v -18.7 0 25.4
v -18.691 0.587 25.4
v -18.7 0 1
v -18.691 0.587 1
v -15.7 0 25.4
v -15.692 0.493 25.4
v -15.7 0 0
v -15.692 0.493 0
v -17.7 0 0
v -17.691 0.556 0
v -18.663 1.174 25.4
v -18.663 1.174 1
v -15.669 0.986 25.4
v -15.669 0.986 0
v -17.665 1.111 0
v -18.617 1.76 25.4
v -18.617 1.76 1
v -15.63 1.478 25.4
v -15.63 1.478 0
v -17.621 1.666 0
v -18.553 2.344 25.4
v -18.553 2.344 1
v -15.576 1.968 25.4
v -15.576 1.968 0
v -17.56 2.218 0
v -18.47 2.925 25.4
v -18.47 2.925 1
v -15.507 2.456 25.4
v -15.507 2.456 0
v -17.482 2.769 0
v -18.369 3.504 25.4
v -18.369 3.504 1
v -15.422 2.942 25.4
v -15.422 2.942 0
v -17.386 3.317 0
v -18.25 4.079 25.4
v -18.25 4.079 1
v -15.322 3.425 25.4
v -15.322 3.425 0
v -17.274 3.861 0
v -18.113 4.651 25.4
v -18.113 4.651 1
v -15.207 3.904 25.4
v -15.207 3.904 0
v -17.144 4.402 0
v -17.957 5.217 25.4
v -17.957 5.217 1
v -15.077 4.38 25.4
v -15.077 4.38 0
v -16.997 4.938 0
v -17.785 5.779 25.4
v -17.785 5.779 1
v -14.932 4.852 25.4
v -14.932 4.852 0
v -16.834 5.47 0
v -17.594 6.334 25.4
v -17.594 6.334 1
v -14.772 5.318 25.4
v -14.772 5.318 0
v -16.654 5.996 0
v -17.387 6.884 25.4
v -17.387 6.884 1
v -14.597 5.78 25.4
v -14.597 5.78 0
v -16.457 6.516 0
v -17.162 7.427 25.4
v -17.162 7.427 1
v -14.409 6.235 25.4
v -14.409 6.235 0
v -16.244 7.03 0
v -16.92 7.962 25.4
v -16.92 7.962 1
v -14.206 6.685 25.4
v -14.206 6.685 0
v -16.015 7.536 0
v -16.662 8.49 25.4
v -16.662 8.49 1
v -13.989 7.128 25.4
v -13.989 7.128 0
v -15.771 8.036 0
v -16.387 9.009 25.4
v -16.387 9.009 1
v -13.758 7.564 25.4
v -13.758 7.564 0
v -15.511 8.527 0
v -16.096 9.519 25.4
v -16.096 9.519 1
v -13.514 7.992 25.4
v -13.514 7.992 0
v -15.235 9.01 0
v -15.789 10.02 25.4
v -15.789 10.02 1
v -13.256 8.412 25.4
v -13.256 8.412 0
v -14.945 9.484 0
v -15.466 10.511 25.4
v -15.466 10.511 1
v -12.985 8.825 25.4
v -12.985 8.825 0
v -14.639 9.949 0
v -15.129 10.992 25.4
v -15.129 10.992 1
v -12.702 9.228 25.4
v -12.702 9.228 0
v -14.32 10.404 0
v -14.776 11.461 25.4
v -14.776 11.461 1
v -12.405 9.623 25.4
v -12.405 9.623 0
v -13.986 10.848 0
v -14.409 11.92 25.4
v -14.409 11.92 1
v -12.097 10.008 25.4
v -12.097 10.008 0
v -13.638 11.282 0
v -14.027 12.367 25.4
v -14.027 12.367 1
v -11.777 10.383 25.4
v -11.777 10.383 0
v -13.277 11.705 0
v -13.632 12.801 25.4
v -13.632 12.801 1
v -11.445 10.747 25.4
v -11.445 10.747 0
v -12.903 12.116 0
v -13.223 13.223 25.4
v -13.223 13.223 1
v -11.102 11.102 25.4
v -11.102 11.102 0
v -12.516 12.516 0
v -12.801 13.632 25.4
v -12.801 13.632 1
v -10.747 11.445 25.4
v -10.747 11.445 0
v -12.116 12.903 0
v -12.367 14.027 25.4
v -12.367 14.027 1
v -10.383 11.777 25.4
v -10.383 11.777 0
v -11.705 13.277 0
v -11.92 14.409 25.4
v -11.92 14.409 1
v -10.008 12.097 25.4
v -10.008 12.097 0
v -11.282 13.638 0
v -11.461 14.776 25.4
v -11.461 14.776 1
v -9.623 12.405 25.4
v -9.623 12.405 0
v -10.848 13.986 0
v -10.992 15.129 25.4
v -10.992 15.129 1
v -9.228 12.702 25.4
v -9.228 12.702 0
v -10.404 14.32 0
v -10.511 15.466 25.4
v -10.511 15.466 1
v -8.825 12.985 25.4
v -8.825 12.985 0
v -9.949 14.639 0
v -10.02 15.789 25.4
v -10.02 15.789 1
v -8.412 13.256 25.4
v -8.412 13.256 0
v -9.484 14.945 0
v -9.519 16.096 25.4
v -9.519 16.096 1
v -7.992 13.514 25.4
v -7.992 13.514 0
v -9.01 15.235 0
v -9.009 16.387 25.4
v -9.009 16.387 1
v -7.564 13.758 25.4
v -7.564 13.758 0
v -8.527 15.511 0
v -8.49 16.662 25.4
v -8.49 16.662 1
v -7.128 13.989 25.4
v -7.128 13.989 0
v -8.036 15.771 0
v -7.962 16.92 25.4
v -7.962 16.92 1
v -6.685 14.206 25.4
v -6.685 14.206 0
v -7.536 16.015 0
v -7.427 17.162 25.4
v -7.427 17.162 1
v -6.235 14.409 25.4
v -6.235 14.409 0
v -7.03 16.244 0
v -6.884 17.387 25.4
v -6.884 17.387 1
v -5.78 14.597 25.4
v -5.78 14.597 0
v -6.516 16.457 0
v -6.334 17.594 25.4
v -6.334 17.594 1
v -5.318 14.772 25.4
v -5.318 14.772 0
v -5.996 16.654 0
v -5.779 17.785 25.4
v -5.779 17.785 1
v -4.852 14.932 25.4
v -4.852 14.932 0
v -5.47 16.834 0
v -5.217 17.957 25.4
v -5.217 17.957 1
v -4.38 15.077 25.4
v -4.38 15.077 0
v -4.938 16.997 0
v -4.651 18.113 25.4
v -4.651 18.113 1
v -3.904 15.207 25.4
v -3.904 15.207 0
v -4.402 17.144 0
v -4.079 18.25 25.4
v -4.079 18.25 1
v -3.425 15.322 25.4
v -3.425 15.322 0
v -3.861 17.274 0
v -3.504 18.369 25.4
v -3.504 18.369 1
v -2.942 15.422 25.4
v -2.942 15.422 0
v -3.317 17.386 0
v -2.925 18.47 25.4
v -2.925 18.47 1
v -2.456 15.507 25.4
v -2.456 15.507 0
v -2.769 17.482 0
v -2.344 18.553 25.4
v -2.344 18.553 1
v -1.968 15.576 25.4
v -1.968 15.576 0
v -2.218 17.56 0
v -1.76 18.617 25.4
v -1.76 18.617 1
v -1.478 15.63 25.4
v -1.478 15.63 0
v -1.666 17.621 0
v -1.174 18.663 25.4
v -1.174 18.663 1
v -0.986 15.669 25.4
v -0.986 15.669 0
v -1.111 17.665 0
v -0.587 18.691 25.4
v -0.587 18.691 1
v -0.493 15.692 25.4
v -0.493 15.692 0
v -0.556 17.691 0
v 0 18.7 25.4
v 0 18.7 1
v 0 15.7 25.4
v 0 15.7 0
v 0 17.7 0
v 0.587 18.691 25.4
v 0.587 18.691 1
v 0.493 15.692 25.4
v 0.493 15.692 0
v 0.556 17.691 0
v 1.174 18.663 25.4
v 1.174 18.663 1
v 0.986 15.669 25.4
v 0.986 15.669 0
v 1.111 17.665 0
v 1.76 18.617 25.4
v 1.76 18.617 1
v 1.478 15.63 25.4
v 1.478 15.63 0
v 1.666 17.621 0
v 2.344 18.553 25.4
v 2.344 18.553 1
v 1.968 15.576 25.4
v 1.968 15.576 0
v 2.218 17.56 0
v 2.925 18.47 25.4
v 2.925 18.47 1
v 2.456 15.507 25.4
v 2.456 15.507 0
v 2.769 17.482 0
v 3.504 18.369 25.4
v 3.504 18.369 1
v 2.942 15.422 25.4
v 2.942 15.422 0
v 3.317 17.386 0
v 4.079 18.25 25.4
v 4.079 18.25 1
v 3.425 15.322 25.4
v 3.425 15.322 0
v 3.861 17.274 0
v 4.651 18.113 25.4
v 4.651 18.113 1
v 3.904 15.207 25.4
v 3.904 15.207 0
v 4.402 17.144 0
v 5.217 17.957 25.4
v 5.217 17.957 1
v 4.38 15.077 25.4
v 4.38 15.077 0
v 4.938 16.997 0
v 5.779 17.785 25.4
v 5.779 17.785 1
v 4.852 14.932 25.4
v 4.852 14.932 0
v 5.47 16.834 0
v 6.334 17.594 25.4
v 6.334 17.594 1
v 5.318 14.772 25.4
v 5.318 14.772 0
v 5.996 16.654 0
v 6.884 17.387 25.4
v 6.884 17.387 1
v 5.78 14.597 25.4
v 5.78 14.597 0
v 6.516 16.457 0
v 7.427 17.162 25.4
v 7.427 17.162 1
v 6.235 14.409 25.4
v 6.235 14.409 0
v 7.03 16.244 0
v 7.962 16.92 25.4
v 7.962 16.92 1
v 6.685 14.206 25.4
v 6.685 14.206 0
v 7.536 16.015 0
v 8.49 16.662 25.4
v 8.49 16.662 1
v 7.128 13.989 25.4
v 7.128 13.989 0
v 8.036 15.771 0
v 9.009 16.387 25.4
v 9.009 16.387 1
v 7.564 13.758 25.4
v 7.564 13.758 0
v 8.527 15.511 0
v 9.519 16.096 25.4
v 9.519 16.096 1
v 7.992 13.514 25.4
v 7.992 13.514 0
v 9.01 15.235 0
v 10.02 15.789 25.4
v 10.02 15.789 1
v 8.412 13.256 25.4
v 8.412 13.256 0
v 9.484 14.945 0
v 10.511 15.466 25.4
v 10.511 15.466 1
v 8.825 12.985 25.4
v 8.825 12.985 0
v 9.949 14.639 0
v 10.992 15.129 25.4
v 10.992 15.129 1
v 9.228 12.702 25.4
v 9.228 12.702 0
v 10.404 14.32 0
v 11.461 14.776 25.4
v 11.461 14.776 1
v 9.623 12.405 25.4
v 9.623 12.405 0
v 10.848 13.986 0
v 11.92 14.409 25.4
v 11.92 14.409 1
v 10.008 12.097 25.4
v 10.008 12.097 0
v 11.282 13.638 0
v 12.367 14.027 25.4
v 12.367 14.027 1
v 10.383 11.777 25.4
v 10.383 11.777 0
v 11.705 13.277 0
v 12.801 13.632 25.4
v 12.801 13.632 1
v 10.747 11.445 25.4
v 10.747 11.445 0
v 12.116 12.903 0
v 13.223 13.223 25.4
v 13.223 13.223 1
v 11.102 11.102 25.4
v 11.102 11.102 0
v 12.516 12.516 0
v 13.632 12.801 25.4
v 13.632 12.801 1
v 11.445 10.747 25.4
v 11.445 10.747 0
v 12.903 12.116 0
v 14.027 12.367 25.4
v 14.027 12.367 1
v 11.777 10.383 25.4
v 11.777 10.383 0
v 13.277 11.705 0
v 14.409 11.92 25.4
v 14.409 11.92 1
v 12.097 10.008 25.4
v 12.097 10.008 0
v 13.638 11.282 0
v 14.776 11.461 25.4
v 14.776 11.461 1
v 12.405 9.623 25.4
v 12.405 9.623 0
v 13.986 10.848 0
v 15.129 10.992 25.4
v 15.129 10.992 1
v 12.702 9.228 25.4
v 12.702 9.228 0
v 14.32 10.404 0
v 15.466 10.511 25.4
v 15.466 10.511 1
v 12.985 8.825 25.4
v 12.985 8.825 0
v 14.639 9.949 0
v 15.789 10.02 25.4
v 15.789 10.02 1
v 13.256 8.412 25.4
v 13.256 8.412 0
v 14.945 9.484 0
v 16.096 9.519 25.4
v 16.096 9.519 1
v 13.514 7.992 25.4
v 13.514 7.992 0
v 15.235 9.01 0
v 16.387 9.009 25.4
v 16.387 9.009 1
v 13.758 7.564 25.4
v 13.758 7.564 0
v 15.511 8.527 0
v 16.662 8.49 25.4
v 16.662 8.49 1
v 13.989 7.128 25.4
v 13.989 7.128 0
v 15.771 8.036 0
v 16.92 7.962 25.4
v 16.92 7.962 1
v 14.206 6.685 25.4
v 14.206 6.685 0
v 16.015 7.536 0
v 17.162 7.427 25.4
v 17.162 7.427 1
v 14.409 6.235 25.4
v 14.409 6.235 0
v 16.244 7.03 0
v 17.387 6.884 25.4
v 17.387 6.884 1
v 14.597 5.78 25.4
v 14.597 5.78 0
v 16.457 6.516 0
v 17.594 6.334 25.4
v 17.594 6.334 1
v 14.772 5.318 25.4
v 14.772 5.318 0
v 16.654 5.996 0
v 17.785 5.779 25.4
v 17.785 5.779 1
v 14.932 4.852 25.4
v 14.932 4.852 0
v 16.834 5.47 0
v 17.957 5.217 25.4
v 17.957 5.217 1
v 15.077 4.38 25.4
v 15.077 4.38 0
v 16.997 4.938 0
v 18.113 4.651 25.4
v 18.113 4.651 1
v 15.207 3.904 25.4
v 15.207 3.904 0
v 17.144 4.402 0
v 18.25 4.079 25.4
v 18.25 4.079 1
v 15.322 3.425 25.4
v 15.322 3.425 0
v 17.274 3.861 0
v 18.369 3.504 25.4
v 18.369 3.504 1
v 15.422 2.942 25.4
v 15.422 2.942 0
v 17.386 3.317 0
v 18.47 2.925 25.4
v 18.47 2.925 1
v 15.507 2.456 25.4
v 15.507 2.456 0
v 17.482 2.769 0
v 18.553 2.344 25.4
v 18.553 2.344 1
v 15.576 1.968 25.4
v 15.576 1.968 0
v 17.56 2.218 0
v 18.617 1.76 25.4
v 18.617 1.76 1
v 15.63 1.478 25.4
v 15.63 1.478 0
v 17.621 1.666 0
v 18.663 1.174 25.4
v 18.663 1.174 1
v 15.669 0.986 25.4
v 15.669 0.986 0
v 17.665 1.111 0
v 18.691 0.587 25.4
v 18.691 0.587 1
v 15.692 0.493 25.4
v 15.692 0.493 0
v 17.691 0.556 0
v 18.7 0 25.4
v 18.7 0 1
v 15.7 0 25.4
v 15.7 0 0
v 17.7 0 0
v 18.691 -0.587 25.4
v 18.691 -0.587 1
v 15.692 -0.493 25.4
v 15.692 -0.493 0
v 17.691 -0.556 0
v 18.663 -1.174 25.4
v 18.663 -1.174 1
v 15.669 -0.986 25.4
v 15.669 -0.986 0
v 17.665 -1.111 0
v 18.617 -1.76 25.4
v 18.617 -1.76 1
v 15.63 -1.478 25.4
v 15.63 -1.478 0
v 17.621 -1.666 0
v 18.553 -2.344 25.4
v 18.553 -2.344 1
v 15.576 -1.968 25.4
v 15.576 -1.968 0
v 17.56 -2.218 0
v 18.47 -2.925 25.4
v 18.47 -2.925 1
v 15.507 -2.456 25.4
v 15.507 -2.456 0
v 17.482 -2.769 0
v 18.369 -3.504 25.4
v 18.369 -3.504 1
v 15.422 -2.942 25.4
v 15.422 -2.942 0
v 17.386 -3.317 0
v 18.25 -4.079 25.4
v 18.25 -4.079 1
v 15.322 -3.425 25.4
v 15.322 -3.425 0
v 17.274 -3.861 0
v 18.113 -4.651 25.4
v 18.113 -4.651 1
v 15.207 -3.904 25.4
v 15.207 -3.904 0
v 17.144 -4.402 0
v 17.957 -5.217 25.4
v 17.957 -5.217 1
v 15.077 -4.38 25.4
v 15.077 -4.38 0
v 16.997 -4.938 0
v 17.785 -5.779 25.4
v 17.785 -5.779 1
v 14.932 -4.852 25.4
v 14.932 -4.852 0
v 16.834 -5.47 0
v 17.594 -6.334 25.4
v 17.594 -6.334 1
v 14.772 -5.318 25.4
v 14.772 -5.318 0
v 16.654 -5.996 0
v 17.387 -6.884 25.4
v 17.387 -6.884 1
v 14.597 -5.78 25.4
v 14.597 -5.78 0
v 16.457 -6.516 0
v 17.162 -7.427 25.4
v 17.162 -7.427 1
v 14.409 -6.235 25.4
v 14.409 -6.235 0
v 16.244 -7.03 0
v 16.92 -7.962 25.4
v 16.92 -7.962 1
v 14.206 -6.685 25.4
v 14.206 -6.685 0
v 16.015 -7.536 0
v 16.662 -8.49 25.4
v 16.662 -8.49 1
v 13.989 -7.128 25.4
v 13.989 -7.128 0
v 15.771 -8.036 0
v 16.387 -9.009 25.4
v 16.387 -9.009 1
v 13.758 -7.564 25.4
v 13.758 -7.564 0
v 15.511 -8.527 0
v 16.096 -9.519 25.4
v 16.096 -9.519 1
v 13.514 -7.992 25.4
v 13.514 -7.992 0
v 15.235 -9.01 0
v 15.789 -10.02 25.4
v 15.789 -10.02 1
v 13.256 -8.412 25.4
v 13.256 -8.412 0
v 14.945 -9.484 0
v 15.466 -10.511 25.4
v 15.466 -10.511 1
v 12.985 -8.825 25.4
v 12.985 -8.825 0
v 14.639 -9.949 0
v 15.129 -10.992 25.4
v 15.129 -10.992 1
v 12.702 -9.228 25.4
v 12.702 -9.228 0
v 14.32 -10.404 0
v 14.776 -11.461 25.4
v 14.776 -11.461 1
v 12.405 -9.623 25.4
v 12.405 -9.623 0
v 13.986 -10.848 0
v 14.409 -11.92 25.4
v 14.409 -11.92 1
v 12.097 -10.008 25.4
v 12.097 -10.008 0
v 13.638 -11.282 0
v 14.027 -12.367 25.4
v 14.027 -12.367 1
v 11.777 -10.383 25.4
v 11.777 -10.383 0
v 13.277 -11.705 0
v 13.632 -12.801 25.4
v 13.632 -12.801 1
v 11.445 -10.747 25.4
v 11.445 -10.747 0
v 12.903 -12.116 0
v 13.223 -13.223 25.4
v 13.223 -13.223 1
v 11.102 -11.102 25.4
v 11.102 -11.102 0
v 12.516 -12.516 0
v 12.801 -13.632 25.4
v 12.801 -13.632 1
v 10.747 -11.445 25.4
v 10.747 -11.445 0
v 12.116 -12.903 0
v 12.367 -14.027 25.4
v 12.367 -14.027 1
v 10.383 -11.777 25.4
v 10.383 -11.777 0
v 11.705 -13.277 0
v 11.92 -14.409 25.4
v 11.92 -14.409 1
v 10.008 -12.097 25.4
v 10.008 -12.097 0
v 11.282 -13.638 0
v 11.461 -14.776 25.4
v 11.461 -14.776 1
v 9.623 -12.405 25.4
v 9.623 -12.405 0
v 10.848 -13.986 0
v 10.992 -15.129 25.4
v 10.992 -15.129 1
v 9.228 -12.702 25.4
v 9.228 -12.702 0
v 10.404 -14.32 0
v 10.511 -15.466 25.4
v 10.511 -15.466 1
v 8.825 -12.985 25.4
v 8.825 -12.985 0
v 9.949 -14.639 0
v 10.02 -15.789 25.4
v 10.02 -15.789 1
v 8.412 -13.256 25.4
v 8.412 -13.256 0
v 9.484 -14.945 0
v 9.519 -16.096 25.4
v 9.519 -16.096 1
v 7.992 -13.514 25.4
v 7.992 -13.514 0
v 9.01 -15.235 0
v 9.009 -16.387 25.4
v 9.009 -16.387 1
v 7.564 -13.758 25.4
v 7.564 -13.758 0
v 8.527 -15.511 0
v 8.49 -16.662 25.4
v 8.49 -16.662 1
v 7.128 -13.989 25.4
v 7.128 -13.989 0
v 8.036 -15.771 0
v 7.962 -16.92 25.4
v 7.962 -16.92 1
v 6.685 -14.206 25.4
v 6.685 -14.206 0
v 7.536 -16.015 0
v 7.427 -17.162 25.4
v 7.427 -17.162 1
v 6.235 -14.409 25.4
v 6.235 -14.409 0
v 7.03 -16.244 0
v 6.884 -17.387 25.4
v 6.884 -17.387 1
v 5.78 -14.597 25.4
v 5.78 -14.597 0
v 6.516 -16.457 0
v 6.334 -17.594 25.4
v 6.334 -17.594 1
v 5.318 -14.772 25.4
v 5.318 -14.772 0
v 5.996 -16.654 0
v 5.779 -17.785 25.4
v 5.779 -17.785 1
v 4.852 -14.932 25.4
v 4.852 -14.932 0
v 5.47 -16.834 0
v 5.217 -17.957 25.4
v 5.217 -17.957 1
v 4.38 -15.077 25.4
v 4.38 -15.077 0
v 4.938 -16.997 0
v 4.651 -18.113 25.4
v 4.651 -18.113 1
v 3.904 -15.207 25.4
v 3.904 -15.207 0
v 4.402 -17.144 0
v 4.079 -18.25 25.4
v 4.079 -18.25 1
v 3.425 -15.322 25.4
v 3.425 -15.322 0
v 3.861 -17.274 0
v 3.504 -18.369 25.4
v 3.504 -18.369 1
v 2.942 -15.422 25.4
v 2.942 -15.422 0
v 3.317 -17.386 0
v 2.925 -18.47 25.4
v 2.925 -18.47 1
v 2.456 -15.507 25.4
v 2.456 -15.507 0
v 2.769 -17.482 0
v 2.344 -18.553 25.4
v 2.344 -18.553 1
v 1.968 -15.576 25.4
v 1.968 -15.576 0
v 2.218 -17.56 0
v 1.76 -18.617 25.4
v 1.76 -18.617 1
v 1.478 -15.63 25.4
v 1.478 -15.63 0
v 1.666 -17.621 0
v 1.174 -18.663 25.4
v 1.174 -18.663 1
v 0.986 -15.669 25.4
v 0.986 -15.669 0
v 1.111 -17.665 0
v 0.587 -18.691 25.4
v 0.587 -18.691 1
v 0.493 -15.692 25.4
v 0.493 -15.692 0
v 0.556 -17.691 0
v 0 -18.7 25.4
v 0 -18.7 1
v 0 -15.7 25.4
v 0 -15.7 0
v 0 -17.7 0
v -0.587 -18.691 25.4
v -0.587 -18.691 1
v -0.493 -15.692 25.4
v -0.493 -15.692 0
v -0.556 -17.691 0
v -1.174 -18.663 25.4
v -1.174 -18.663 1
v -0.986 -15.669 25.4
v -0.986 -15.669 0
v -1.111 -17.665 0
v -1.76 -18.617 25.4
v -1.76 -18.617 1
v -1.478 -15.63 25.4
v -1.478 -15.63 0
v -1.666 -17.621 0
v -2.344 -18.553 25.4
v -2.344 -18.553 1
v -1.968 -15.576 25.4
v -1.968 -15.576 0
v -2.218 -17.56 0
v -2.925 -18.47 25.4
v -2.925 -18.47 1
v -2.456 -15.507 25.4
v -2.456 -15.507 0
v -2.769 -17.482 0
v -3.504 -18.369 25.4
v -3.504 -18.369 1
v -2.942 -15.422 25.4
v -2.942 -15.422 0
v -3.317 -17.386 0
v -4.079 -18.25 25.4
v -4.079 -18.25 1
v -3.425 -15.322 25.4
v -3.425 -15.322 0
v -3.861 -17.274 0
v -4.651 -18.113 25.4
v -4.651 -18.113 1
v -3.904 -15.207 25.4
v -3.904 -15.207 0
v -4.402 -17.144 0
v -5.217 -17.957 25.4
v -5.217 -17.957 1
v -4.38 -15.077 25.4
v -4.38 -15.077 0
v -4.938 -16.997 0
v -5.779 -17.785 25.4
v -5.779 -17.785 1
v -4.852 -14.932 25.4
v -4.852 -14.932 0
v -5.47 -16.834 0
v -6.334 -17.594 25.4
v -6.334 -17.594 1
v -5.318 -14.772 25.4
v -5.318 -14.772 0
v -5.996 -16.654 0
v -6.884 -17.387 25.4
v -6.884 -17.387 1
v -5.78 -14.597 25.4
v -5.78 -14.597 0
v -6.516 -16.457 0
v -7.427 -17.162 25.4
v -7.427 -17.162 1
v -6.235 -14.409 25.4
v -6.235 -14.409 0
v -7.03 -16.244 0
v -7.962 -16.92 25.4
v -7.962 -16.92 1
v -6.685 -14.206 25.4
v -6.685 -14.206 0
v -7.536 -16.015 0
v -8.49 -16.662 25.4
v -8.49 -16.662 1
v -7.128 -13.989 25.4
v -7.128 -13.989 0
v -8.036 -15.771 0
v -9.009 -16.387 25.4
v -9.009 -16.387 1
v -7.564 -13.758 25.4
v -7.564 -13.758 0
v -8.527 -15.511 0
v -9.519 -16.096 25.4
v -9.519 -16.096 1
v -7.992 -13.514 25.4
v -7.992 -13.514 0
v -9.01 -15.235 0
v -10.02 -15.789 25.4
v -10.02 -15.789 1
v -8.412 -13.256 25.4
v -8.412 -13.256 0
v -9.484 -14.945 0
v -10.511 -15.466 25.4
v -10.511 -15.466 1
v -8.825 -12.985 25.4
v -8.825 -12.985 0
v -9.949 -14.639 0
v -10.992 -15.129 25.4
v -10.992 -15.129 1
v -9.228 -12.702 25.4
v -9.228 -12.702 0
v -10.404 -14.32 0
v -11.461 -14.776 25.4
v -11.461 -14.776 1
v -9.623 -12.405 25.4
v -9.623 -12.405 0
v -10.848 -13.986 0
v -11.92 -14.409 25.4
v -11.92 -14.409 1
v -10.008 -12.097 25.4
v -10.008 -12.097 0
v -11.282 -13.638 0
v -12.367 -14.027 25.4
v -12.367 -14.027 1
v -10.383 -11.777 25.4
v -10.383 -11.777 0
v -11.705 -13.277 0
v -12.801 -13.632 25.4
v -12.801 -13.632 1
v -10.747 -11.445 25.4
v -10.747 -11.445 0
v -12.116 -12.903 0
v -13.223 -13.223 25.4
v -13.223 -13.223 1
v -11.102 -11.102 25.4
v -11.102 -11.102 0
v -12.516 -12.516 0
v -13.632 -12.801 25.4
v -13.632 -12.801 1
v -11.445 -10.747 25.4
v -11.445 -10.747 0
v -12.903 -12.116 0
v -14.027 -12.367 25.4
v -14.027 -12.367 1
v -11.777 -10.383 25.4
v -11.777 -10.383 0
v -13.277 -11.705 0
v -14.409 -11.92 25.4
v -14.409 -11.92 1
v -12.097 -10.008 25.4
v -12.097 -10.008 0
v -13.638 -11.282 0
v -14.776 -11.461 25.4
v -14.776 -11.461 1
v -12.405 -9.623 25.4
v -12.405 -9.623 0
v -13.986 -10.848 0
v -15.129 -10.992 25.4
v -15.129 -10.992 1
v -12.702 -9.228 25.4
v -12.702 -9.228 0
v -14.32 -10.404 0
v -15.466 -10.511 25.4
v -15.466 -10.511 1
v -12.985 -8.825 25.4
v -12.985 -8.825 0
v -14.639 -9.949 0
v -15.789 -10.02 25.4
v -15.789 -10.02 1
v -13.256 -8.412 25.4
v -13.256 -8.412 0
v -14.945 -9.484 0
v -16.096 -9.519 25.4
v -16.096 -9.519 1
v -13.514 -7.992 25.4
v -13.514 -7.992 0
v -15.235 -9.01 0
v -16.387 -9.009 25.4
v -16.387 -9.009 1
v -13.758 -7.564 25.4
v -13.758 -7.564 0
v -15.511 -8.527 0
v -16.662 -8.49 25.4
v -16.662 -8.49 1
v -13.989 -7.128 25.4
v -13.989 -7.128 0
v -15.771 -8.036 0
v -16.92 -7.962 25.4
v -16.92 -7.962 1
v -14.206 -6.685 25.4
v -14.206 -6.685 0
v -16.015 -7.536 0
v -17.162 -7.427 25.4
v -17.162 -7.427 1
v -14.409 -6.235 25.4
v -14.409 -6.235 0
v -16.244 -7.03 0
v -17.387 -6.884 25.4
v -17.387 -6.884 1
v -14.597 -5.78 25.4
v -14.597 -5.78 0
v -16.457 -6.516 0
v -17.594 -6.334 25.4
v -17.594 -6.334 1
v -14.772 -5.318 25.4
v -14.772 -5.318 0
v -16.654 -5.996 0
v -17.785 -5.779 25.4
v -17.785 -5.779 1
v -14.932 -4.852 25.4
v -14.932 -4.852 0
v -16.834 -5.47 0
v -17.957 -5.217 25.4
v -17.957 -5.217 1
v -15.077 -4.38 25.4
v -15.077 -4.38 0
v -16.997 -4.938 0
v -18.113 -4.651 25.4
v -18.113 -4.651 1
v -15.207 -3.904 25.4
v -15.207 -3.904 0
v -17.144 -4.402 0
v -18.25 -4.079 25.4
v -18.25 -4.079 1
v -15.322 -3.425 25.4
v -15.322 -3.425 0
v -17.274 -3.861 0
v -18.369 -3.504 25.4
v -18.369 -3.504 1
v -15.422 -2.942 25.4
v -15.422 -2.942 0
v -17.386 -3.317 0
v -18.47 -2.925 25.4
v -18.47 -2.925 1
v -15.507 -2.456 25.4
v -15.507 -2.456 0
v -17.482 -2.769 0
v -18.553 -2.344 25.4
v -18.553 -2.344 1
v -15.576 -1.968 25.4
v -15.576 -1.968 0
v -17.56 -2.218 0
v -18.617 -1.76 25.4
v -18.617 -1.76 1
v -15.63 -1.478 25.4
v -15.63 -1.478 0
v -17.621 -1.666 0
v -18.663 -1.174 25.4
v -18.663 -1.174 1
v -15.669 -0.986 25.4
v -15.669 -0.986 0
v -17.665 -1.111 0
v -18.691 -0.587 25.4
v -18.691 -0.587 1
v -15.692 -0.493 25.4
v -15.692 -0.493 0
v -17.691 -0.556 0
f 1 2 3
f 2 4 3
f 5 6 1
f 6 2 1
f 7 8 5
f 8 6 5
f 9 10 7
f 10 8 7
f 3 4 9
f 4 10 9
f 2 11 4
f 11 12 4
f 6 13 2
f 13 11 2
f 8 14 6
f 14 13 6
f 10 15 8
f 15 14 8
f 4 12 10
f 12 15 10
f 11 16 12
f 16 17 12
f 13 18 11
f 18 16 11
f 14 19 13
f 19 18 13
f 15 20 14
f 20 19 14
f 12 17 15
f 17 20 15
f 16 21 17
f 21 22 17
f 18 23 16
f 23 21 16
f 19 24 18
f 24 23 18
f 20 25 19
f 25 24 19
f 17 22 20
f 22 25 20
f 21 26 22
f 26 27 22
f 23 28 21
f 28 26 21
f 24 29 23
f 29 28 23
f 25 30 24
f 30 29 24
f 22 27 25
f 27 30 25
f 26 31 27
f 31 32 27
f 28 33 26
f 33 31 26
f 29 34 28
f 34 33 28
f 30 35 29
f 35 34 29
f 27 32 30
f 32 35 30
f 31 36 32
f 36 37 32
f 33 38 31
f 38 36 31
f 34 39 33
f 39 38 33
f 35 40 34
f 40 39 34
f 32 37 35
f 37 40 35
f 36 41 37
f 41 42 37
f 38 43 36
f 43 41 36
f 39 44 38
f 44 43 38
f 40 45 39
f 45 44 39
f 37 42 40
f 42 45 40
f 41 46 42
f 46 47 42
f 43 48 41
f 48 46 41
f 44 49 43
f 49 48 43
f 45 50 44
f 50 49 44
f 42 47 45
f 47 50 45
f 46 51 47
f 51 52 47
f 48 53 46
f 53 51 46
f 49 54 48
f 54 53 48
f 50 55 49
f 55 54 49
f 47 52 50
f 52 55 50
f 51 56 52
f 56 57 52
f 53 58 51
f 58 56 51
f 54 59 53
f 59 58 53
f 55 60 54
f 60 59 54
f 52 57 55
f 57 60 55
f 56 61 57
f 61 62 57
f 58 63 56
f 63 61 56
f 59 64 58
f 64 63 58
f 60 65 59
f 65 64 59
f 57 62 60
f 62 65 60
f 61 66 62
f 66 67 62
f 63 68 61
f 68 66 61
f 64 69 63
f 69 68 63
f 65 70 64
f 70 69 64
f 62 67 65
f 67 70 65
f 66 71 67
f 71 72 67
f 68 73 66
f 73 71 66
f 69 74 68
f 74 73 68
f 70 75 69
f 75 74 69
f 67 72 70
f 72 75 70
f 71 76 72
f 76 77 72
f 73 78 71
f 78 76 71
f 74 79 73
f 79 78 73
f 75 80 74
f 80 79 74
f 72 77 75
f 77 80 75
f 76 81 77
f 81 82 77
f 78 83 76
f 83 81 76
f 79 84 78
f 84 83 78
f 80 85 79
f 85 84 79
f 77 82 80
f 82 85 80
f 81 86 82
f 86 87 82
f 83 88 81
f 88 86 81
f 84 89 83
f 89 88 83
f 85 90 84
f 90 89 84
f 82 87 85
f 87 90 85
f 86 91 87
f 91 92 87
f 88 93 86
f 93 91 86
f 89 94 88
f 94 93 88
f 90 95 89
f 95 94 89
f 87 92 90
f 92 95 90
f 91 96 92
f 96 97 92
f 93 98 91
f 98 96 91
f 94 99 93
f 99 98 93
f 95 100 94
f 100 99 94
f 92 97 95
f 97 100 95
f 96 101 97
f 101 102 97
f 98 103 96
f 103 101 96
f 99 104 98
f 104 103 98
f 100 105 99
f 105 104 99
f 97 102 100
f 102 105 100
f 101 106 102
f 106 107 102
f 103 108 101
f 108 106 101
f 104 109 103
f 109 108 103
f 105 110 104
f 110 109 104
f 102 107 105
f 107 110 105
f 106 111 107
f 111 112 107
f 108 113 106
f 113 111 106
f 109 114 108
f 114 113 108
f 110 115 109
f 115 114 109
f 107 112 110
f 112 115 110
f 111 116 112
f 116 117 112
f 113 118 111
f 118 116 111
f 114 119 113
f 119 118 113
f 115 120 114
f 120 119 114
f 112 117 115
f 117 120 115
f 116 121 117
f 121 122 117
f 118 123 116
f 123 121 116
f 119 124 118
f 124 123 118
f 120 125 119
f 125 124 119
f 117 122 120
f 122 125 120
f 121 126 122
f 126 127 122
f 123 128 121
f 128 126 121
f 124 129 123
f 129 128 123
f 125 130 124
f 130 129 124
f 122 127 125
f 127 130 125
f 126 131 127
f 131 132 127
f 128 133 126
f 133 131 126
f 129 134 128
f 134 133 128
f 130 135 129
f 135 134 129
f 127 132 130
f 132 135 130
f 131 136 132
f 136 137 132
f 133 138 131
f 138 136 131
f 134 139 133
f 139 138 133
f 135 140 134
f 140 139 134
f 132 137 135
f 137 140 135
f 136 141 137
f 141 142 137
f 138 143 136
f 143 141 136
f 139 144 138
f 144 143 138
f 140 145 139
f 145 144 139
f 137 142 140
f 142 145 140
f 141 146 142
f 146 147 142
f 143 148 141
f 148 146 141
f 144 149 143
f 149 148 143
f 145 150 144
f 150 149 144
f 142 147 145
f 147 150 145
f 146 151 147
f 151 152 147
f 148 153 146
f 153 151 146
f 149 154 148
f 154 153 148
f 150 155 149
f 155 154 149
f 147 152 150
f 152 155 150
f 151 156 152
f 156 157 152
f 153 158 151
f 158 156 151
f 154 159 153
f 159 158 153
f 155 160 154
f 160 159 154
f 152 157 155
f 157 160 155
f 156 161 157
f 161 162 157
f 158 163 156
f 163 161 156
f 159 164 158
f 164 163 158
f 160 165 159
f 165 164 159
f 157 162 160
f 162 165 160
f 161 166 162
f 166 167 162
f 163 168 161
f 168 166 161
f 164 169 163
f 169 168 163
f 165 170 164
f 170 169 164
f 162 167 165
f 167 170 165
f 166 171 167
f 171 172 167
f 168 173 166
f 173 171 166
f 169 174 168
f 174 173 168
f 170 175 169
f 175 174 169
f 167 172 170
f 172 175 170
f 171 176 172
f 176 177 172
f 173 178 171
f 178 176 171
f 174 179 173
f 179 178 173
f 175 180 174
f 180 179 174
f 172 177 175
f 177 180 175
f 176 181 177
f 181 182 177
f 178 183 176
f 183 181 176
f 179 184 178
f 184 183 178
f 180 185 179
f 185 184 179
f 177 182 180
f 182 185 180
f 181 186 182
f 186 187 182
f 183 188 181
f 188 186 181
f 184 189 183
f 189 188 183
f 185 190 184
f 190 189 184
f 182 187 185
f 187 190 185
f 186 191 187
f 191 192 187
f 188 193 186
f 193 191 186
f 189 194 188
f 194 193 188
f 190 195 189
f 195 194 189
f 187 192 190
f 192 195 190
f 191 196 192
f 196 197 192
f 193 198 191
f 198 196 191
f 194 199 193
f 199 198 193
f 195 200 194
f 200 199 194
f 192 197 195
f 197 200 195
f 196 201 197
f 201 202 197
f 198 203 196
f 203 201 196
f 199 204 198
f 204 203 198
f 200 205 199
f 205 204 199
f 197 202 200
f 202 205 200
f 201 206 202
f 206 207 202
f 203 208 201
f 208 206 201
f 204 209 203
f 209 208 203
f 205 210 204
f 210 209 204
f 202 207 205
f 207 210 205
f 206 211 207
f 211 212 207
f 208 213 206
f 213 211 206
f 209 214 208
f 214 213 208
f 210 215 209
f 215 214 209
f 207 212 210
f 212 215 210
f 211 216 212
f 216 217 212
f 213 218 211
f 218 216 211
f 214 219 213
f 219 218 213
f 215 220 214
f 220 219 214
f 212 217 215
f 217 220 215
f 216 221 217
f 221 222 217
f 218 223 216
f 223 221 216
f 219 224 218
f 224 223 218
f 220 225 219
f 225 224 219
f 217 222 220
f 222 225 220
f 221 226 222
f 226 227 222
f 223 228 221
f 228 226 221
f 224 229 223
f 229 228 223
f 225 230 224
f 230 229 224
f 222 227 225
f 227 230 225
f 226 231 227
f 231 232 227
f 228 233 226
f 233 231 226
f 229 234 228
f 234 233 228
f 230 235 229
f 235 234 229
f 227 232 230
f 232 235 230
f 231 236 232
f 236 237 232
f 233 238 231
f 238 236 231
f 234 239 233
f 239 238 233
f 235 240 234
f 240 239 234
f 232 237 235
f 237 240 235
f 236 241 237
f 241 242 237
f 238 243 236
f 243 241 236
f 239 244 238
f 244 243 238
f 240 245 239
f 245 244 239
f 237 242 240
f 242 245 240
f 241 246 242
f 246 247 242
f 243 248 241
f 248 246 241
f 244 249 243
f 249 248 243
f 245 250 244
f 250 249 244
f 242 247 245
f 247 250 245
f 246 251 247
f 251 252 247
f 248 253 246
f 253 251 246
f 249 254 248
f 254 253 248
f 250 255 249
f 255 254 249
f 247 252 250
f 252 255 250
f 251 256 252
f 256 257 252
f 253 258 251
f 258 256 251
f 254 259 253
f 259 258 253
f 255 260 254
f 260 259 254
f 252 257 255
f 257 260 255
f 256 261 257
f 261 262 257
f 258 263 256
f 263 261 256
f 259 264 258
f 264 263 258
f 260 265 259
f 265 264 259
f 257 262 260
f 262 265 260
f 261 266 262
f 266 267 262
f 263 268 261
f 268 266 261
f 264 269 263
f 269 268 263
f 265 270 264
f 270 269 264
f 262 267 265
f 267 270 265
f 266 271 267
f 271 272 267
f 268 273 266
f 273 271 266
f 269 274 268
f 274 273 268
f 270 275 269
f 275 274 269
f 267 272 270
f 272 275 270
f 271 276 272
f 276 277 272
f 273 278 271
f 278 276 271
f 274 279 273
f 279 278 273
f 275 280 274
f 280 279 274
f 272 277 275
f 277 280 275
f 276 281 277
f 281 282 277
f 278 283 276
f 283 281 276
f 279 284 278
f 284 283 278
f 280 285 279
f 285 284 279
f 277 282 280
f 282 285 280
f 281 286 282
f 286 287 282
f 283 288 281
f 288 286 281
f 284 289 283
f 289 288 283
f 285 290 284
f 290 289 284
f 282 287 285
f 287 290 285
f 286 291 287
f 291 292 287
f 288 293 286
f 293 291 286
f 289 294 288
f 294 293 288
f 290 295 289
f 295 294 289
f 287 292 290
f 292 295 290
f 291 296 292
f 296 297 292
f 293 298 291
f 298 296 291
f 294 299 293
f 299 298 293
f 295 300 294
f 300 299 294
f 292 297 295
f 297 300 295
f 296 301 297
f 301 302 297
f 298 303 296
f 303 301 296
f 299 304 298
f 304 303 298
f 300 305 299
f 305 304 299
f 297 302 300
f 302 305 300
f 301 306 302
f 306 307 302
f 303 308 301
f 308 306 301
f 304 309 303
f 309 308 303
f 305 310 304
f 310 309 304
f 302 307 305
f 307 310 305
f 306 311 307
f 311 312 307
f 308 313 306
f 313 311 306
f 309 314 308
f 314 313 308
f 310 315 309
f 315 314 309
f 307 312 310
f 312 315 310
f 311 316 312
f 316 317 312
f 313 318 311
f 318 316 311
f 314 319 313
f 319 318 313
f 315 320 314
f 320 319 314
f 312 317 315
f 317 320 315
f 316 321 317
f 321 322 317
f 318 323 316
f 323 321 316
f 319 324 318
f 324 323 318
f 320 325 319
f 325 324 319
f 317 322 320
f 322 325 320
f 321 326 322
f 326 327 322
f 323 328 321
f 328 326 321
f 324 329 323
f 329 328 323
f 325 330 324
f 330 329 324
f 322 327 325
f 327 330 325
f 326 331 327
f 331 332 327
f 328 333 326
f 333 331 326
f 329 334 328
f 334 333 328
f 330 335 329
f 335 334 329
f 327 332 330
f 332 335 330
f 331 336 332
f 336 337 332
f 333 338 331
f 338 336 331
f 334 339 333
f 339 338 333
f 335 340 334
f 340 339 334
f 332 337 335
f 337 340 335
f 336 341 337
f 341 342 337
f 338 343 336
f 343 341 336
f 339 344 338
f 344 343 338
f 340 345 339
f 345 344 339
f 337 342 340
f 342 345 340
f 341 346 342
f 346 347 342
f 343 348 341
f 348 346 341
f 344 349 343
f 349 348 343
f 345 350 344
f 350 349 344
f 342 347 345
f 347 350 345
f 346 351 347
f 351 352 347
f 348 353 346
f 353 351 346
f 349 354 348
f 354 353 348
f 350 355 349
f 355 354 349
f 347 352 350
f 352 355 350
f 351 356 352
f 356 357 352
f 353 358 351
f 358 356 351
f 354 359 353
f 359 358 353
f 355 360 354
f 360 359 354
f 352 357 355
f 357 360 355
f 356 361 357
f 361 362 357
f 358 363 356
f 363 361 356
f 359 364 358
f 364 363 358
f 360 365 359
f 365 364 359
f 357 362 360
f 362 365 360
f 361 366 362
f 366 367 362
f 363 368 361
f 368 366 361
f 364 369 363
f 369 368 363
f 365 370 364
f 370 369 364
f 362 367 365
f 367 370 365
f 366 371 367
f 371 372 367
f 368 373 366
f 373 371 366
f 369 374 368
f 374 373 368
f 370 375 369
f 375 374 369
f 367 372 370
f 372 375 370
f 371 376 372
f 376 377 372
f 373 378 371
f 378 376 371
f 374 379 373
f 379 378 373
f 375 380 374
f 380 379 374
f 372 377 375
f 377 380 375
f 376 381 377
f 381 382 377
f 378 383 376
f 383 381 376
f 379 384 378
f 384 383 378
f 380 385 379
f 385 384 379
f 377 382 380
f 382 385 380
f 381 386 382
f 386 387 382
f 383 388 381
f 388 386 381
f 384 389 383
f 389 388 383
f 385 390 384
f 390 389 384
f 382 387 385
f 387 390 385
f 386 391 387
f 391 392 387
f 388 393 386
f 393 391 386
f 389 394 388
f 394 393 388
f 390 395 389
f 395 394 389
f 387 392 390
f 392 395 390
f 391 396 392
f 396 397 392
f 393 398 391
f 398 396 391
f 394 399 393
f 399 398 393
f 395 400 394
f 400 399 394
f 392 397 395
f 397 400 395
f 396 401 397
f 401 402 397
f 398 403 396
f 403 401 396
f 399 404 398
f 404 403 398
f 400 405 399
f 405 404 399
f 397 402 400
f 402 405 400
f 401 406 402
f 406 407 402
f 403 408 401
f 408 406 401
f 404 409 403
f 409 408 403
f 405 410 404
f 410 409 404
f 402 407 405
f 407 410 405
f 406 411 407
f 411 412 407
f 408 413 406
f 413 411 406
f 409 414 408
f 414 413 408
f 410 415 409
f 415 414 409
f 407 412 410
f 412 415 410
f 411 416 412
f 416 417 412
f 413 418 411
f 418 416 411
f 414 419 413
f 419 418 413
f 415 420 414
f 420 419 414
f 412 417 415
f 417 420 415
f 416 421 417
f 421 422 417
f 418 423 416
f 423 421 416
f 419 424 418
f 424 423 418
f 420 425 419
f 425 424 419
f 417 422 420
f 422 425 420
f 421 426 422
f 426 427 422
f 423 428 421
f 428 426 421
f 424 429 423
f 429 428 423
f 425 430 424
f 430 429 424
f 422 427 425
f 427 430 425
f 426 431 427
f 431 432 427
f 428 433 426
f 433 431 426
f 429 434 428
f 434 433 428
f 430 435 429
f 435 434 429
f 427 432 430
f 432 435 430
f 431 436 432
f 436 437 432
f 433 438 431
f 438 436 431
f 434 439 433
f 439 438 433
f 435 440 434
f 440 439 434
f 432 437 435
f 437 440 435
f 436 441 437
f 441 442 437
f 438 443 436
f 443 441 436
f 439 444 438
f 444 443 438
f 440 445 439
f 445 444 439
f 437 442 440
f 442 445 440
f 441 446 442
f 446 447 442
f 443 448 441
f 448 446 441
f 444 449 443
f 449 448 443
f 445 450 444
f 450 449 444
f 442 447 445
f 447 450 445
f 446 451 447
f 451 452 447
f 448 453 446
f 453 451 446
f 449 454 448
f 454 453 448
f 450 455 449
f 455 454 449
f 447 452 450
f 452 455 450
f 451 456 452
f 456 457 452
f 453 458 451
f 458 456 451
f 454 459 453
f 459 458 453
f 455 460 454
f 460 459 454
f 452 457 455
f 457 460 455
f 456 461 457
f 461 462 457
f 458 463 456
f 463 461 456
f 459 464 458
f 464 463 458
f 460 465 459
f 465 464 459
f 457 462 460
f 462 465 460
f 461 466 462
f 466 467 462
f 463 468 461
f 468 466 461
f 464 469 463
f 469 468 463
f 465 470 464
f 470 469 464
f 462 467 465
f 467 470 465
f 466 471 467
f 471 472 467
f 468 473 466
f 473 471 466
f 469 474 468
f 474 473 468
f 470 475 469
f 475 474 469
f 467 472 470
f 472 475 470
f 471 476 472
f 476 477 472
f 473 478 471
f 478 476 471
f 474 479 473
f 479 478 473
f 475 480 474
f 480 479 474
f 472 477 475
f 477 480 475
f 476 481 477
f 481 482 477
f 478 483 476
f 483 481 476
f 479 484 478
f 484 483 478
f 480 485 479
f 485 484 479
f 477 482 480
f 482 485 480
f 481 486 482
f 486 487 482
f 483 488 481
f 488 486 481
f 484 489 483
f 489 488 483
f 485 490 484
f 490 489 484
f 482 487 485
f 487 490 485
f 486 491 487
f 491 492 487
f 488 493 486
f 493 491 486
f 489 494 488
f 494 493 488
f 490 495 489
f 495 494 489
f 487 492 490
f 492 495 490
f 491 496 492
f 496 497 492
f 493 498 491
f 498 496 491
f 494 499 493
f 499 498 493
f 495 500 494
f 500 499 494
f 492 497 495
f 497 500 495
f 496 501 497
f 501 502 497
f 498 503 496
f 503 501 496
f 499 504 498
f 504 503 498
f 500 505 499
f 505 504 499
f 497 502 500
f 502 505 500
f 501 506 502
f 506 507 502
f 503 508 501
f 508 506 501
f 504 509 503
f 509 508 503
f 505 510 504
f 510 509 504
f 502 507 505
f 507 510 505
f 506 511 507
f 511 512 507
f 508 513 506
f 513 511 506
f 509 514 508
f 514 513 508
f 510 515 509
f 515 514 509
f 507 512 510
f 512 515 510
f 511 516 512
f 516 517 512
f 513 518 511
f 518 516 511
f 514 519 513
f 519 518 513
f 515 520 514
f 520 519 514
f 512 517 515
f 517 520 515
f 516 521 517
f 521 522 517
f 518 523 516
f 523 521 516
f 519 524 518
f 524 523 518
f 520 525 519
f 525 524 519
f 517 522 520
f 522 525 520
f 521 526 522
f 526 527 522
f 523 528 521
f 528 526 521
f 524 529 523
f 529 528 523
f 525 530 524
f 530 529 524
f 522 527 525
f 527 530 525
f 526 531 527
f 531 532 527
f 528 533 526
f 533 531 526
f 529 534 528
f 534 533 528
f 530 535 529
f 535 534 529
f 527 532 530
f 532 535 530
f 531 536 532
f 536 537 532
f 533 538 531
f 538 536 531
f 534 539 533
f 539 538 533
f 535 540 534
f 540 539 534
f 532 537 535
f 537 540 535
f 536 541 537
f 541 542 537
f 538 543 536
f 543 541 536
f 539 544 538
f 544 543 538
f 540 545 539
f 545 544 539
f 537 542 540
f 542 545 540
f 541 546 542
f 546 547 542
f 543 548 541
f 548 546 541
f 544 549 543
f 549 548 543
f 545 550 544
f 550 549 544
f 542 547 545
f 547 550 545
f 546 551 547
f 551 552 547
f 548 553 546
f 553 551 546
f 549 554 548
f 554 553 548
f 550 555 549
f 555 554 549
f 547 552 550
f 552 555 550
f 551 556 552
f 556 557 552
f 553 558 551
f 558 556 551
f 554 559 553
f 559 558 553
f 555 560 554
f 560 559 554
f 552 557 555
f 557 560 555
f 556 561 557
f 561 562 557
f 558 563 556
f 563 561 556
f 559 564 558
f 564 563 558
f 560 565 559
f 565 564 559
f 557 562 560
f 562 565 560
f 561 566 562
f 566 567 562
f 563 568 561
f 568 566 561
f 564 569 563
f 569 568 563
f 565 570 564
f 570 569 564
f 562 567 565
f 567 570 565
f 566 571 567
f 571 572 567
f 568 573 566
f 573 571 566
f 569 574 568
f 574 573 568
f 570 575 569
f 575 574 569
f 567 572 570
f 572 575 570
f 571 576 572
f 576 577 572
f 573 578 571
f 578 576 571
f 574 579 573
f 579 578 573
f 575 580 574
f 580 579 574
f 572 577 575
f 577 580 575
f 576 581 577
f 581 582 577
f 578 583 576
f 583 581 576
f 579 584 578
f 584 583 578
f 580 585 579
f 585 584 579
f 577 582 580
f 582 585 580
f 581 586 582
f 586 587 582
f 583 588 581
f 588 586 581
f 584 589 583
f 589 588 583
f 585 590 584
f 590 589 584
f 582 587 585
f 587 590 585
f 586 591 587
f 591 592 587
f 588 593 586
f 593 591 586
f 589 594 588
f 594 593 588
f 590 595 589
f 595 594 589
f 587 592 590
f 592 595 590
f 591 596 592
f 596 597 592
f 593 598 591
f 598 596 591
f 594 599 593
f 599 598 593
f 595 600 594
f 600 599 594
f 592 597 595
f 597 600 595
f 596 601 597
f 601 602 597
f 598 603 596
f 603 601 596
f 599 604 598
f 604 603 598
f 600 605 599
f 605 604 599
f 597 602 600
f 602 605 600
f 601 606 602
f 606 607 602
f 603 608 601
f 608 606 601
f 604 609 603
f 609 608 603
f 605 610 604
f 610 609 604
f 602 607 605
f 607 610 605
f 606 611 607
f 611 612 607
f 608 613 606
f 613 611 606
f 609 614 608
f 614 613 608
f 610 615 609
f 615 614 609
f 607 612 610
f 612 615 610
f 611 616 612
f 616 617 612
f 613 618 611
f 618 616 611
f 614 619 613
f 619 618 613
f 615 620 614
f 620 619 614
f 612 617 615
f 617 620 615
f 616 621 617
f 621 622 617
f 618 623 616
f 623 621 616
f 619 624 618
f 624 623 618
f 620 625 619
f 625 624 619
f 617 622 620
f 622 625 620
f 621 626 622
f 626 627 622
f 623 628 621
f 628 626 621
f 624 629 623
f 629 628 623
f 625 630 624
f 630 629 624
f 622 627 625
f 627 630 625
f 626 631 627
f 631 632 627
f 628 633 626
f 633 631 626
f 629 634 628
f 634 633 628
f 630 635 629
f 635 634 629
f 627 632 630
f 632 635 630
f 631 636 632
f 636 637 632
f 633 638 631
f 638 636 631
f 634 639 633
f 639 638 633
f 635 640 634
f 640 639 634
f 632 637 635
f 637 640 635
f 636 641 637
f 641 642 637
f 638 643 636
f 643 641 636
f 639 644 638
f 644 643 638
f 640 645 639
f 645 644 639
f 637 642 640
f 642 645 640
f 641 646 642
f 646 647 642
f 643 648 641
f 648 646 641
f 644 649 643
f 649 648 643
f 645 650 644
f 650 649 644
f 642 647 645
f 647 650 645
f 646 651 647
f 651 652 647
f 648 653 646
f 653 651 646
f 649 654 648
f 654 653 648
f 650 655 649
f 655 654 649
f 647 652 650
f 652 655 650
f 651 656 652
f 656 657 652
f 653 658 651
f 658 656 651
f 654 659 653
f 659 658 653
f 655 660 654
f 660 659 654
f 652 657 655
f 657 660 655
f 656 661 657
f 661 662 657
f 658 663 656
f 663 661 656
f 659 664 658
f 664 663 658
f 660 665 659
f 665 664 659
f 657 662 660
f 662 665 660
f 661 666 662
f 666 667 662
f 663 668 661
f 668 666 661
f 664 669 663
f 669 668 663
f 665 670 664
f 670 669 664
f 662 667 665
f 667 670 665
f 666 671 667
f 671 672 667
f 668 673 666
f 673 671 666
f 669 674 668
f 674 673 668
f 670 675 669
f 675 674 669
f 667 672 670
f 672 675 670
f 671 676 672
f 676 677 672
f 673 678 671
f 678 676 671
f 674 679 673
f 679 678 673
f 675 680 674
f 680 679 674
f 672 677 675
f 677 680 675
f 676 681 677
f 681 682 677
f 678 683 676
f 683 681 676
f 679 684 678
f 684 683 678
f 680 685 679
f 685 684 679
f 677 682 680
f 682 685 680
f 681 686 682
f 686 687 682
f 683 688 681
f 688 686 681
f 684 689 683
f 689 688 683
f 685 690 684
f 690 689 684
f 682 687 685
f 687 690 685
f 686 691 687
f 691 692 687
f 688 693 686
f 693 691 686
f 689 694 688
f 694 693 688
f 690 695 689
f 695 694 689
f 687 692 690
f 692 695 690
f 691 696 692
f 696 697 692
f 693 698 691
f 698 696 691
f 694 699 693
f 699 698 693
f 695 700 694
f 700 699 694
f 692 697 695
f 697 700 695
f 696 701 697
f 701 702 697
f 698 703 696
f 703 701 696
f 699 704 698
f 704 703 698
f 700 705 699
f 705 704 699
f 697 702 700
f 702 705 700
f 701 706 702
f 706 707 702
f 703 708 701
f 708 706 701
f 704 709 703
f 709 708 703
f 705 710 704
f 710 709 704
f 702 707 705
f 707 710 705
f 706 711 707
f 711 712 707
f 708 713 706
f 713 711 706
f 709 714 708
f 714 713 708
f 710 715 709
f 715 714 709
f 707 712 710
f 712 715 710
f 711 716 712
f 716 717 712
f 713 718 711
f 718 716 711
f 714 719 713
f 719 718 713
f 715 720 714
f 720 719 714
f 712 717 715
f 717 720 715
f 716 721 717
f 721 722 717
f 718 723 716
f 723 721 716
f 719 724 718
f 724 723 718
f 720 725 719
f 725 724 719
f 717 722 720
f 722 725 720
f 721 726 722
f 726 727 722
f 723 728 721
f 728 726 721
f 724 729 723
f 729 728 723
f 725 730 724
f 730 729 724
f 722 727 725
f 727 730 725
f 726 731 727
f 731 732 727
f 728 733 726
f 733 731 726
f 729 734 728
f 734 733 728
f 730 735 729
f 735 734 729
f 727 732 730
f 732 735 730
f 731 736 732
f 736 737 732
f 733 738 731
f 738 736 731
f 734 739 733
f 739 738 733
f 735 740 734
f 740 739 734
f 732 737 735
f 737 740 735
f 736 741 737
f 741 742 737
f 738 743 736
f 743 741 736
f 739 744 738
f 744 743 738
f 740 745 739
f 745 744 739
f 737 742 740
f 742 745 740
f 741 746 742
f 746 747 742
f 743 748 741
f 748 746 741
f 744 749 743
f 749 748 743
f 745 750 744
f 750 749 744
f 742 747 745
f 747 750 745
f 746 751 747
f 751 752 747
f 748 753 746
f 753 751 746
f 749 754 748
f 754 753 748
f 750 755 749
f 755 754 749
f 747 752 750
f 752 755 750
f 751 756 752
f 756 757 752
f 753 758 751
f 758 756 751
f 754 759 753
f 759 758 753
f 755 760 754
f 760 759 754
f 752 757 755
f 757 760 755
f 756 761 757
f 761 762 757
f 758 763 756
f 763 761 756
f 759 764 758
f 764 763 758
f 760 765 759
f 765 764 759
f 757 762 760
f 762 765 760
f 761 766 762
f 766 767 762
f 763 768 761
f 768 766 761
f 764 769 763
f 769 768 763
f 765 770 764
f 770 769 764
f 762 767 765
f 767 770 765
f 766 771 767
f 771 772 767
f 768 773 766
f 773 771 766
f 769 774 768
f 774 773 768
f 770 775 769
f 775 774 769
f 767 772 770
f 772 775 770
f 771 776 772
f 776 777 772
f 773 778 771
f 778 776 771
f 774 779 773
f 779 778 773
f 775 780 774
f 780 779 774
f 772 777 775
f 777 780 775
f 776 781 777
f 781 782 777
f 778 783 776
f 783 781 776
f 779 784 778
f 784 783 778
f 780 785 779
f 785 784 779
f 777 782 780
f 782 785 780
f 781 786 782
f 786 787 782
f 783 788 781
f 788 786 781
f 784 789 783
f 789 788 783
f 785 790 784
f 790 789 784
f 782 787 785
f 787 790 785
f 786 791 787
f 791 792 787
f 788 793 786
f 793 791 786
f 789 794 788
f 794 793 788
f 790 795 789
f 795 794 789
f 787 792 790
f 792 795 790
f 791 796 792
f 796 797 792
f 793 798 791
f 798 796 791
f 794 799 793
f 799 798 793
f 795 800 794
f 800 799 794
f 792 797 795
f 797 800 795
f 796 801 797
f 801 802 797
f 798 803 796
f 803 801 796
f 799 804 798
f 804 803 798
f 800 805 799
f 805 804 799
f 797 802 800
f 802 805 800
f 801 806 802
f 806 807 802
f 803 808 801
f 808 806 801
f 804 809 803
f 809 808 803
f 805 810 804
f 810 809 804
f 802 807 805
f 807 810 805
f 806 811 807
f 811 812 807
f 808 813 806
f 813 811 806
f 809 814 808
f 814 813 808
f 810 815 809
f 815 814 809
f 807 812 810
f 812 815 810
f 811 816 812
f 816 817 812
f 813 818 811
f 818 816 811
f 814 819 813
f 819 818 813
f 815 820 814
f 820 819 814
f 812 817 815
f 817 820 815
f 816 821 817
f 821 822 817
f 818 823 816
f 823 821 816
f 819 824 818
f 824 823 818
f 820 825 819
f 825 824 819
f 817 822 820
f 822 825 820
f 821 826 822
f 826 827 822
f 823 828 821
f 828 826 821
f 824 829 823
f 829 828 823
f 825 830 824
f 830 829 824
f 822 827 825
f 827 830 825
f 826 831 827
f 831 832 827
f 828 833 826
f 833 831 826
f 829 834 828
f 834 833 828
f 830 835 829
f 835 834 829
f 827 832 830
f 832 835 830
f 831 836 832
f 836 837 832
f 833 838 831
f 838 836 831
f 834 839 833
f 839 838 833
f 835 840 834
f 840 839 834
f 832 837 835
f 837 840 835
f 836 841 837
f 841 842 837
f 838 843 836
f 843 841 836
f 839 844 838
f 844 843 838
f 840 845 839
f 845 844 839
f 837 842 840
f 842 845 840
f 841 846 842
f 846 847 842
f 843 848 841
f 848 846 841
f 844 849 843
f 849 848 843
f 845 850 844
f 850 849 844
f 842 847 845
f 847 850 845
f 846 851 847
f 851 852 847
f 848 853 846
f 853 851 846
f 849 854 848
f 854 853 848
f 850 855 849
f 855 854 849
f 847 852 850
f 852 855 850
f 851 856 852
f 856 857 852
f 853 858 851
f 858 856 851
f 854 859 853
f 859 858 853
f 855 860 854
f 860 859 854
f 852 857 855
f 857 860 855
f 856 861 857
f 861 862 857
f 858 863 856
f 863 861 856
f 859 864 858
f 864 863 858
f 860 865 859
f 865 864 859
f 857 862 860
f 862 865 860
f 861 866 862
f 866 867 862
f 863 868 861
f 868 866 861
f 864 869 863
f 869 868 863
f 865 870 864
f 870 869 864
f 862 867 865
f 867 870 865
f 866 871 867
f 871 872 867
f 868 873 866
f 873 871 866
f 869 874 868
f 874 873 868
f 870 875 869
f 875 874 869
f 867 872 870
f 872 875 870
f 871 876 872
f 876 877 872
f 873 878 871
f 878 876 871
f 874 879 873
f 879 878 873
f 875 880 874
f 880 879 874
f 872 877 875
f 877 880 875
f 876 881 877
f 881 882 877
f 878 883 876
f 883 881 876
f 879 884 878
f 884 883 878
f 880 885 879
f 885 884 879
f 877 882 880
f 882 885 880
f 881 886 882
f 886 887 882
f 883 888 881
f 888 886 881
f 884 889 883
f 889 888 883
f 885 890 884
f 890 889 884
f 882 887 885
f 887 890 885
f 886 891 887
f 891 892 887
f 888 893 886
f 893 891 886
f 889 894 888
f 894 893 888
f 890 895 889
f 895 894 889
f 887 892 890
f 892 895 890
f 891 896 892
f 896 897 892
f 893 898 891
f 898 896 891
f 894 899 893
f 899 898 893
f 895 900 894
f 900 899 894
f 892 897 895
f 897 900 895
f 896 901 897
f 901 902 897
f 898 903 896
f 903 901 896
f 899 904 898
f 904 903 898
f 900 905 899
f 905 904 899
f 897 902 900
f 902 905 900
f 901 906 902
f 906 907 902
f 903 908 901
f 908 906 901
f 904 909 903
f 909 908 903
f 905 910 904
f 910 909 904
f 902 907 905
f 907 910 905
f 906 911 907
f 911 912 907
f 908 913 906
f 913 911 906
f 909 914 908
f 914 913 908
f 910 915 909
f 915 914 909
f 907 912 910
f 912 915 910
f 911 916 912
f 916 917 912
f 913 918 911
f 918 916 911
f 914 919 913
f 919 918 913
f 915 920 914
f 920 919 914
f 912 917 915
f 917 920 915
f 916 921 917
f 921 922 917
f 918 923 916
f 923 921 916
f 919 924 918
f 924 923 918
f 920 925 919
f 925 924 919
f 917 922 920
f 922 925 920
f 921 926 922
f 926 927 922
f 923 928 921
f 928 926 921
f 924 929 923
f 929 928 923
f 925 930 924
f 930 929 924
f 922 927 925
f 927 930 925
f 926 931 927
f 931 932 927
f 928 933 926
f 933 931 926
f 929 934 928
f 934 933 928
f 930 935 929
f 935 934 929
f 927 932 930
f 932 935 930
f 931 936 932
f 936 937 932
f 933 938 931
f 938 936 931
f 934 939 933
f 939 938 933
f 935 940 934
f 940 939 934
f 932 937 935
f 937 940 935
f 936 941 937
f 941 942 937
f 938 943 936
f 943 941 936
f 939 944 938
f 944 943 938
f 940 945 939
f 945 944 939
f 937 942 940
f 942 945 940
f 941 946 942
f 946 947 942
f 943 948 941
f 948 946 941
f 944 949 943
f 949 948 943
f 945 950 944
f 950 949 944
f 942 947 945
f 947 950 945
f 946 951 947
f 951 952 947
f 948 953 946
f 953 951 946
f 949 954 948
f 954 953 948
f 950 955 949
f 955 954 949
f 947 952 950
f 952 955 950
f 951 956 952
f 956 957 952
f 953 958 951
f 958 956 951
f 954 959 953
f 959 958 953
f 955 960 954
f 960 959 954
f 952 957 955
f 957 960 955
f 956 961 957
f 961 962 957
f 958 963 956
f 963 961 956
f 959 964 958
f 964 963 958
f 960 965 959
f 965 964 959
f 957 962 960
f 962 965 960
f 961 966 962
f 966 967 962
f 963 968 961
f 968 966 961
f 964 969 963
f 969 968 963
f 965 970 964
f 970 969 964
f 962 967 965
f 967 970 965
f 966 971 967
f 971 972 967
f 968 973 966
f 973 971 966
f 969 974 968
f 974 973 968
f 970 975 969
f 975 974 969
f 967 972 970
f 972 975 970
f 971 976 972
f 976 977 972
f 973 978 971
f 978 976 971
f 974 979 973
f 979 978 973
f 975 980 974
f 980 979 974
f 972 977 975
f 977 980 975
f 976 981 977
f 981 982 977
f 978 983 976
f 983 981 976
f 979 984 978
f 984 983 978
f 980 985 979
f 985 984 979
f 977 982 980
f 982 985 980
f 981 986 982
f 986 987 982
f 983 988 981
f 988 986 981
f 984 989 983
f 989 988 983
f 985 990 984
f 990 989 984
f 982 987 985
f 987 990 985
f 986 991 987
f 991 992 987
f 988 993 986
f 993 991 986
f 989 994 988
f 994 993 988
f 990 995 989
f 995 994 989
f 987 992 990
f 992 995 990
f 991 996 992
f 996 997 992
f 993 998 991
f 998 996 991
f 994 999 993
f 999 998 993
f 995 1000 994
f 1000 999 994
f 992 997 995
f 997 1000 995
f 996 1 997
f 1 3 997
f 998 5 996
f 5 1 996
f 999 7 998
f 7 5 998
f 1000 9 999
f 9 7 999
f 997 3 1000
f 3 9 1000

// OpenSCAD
// file: RocketCouplers.scad
bt20id = 18.0;  // Motors ABC
bt50id = 24.1;  // Motors DE
bt52hid = 29.0; // Motors EFG
bt55id = 32.6;
bt60id = 40.6;
bt70id = 55.2;
bt80id = 65.0;

bt20od = 18.7;
bt50od = 24.8;
bt52hod = 31.0;
bt55od = 33.7;
bt60od = 41.7;
bt70od = 56.3;
bt80od = 66.0;

module hollowCylinderAsBase(r,wall,h)
{
    pts = [
        [r-wall,h],
        [r,h],
        [r,1],
        [r-1,0],
        [r-wall,0]];
    rotate_extrude()
    polygon(pts,convexity=2);
}

module hollowCylinderWithDrop(r,wall,h)
{
    pts = [
        [r-wall,h],
        [r,h],
        [r,0],
        [r-wall/2,-wall/2],
        [r-wall,0]];
    rotate_extrude()
    polygon(pts,convexity=2);
}

module hollowConeWithDrop(r1,r2,wall,h)
{
    pts = [
    [r2-wall,h],
    [r2,h],
    [r1,0],
    [r1-wall/2,-wall/2],
    [r1-wall,0]];
    rotate_extrude()
    polygon(pts,convexity=2);
}

module hollowConeWithDropAndHole(r1,r2,wall,h)
{
    pts = [
    [r2-wall,h],
    [r2,h],
    [r1,0],
    [r1-wall/2,-wall/2],
    [r1-wall,0]];
    difference()
    {
        rotate_extrude()
        polygon(pts,convexity=2);
        translate([(r1+r2-wall)/2.0,0])
        cylinder(r=wall/1.5,h);
    }
}

// This is a spherical cap that has a slope of -1 at its edge.

module capWithDrop(r)
{
    rho = 1.414*r;
    translate([0,0,-r])
    intersection()
    {
        sphere(rho,$fn=50);
        cylinder(r1=0,r2=2*rho,h=2*rho);
        translate([-2*rho,-2*rho,r-1])
        cube(4*rho);
    }    
}

//capWithDrop(10);

/*
wall = 3;
h1 = 10;
h2 = 25;
h3 = 10;
hollowCylinderAsBase(bt55id/2,wall,h1);
translate([0,0,h1])
hollowConeWithDropAndHole(bt55od/2,bt70od/2,wall,h2);
translate([0,0,h1+h2])
hollowCylinderWithDrop(bt70id/2,wall,h3);
*/
// main file
$fn = 200;
inch = 25.4;

include <RocketCouplers.scad>

r1 = bt52hod/2 + 0.2; // 0.3 for 70 and 80. 0.2 for 50 and 55.
wall = 3;
height = 1*inch;

hollowCylinderAsBase(r1+wall,wall,height);
